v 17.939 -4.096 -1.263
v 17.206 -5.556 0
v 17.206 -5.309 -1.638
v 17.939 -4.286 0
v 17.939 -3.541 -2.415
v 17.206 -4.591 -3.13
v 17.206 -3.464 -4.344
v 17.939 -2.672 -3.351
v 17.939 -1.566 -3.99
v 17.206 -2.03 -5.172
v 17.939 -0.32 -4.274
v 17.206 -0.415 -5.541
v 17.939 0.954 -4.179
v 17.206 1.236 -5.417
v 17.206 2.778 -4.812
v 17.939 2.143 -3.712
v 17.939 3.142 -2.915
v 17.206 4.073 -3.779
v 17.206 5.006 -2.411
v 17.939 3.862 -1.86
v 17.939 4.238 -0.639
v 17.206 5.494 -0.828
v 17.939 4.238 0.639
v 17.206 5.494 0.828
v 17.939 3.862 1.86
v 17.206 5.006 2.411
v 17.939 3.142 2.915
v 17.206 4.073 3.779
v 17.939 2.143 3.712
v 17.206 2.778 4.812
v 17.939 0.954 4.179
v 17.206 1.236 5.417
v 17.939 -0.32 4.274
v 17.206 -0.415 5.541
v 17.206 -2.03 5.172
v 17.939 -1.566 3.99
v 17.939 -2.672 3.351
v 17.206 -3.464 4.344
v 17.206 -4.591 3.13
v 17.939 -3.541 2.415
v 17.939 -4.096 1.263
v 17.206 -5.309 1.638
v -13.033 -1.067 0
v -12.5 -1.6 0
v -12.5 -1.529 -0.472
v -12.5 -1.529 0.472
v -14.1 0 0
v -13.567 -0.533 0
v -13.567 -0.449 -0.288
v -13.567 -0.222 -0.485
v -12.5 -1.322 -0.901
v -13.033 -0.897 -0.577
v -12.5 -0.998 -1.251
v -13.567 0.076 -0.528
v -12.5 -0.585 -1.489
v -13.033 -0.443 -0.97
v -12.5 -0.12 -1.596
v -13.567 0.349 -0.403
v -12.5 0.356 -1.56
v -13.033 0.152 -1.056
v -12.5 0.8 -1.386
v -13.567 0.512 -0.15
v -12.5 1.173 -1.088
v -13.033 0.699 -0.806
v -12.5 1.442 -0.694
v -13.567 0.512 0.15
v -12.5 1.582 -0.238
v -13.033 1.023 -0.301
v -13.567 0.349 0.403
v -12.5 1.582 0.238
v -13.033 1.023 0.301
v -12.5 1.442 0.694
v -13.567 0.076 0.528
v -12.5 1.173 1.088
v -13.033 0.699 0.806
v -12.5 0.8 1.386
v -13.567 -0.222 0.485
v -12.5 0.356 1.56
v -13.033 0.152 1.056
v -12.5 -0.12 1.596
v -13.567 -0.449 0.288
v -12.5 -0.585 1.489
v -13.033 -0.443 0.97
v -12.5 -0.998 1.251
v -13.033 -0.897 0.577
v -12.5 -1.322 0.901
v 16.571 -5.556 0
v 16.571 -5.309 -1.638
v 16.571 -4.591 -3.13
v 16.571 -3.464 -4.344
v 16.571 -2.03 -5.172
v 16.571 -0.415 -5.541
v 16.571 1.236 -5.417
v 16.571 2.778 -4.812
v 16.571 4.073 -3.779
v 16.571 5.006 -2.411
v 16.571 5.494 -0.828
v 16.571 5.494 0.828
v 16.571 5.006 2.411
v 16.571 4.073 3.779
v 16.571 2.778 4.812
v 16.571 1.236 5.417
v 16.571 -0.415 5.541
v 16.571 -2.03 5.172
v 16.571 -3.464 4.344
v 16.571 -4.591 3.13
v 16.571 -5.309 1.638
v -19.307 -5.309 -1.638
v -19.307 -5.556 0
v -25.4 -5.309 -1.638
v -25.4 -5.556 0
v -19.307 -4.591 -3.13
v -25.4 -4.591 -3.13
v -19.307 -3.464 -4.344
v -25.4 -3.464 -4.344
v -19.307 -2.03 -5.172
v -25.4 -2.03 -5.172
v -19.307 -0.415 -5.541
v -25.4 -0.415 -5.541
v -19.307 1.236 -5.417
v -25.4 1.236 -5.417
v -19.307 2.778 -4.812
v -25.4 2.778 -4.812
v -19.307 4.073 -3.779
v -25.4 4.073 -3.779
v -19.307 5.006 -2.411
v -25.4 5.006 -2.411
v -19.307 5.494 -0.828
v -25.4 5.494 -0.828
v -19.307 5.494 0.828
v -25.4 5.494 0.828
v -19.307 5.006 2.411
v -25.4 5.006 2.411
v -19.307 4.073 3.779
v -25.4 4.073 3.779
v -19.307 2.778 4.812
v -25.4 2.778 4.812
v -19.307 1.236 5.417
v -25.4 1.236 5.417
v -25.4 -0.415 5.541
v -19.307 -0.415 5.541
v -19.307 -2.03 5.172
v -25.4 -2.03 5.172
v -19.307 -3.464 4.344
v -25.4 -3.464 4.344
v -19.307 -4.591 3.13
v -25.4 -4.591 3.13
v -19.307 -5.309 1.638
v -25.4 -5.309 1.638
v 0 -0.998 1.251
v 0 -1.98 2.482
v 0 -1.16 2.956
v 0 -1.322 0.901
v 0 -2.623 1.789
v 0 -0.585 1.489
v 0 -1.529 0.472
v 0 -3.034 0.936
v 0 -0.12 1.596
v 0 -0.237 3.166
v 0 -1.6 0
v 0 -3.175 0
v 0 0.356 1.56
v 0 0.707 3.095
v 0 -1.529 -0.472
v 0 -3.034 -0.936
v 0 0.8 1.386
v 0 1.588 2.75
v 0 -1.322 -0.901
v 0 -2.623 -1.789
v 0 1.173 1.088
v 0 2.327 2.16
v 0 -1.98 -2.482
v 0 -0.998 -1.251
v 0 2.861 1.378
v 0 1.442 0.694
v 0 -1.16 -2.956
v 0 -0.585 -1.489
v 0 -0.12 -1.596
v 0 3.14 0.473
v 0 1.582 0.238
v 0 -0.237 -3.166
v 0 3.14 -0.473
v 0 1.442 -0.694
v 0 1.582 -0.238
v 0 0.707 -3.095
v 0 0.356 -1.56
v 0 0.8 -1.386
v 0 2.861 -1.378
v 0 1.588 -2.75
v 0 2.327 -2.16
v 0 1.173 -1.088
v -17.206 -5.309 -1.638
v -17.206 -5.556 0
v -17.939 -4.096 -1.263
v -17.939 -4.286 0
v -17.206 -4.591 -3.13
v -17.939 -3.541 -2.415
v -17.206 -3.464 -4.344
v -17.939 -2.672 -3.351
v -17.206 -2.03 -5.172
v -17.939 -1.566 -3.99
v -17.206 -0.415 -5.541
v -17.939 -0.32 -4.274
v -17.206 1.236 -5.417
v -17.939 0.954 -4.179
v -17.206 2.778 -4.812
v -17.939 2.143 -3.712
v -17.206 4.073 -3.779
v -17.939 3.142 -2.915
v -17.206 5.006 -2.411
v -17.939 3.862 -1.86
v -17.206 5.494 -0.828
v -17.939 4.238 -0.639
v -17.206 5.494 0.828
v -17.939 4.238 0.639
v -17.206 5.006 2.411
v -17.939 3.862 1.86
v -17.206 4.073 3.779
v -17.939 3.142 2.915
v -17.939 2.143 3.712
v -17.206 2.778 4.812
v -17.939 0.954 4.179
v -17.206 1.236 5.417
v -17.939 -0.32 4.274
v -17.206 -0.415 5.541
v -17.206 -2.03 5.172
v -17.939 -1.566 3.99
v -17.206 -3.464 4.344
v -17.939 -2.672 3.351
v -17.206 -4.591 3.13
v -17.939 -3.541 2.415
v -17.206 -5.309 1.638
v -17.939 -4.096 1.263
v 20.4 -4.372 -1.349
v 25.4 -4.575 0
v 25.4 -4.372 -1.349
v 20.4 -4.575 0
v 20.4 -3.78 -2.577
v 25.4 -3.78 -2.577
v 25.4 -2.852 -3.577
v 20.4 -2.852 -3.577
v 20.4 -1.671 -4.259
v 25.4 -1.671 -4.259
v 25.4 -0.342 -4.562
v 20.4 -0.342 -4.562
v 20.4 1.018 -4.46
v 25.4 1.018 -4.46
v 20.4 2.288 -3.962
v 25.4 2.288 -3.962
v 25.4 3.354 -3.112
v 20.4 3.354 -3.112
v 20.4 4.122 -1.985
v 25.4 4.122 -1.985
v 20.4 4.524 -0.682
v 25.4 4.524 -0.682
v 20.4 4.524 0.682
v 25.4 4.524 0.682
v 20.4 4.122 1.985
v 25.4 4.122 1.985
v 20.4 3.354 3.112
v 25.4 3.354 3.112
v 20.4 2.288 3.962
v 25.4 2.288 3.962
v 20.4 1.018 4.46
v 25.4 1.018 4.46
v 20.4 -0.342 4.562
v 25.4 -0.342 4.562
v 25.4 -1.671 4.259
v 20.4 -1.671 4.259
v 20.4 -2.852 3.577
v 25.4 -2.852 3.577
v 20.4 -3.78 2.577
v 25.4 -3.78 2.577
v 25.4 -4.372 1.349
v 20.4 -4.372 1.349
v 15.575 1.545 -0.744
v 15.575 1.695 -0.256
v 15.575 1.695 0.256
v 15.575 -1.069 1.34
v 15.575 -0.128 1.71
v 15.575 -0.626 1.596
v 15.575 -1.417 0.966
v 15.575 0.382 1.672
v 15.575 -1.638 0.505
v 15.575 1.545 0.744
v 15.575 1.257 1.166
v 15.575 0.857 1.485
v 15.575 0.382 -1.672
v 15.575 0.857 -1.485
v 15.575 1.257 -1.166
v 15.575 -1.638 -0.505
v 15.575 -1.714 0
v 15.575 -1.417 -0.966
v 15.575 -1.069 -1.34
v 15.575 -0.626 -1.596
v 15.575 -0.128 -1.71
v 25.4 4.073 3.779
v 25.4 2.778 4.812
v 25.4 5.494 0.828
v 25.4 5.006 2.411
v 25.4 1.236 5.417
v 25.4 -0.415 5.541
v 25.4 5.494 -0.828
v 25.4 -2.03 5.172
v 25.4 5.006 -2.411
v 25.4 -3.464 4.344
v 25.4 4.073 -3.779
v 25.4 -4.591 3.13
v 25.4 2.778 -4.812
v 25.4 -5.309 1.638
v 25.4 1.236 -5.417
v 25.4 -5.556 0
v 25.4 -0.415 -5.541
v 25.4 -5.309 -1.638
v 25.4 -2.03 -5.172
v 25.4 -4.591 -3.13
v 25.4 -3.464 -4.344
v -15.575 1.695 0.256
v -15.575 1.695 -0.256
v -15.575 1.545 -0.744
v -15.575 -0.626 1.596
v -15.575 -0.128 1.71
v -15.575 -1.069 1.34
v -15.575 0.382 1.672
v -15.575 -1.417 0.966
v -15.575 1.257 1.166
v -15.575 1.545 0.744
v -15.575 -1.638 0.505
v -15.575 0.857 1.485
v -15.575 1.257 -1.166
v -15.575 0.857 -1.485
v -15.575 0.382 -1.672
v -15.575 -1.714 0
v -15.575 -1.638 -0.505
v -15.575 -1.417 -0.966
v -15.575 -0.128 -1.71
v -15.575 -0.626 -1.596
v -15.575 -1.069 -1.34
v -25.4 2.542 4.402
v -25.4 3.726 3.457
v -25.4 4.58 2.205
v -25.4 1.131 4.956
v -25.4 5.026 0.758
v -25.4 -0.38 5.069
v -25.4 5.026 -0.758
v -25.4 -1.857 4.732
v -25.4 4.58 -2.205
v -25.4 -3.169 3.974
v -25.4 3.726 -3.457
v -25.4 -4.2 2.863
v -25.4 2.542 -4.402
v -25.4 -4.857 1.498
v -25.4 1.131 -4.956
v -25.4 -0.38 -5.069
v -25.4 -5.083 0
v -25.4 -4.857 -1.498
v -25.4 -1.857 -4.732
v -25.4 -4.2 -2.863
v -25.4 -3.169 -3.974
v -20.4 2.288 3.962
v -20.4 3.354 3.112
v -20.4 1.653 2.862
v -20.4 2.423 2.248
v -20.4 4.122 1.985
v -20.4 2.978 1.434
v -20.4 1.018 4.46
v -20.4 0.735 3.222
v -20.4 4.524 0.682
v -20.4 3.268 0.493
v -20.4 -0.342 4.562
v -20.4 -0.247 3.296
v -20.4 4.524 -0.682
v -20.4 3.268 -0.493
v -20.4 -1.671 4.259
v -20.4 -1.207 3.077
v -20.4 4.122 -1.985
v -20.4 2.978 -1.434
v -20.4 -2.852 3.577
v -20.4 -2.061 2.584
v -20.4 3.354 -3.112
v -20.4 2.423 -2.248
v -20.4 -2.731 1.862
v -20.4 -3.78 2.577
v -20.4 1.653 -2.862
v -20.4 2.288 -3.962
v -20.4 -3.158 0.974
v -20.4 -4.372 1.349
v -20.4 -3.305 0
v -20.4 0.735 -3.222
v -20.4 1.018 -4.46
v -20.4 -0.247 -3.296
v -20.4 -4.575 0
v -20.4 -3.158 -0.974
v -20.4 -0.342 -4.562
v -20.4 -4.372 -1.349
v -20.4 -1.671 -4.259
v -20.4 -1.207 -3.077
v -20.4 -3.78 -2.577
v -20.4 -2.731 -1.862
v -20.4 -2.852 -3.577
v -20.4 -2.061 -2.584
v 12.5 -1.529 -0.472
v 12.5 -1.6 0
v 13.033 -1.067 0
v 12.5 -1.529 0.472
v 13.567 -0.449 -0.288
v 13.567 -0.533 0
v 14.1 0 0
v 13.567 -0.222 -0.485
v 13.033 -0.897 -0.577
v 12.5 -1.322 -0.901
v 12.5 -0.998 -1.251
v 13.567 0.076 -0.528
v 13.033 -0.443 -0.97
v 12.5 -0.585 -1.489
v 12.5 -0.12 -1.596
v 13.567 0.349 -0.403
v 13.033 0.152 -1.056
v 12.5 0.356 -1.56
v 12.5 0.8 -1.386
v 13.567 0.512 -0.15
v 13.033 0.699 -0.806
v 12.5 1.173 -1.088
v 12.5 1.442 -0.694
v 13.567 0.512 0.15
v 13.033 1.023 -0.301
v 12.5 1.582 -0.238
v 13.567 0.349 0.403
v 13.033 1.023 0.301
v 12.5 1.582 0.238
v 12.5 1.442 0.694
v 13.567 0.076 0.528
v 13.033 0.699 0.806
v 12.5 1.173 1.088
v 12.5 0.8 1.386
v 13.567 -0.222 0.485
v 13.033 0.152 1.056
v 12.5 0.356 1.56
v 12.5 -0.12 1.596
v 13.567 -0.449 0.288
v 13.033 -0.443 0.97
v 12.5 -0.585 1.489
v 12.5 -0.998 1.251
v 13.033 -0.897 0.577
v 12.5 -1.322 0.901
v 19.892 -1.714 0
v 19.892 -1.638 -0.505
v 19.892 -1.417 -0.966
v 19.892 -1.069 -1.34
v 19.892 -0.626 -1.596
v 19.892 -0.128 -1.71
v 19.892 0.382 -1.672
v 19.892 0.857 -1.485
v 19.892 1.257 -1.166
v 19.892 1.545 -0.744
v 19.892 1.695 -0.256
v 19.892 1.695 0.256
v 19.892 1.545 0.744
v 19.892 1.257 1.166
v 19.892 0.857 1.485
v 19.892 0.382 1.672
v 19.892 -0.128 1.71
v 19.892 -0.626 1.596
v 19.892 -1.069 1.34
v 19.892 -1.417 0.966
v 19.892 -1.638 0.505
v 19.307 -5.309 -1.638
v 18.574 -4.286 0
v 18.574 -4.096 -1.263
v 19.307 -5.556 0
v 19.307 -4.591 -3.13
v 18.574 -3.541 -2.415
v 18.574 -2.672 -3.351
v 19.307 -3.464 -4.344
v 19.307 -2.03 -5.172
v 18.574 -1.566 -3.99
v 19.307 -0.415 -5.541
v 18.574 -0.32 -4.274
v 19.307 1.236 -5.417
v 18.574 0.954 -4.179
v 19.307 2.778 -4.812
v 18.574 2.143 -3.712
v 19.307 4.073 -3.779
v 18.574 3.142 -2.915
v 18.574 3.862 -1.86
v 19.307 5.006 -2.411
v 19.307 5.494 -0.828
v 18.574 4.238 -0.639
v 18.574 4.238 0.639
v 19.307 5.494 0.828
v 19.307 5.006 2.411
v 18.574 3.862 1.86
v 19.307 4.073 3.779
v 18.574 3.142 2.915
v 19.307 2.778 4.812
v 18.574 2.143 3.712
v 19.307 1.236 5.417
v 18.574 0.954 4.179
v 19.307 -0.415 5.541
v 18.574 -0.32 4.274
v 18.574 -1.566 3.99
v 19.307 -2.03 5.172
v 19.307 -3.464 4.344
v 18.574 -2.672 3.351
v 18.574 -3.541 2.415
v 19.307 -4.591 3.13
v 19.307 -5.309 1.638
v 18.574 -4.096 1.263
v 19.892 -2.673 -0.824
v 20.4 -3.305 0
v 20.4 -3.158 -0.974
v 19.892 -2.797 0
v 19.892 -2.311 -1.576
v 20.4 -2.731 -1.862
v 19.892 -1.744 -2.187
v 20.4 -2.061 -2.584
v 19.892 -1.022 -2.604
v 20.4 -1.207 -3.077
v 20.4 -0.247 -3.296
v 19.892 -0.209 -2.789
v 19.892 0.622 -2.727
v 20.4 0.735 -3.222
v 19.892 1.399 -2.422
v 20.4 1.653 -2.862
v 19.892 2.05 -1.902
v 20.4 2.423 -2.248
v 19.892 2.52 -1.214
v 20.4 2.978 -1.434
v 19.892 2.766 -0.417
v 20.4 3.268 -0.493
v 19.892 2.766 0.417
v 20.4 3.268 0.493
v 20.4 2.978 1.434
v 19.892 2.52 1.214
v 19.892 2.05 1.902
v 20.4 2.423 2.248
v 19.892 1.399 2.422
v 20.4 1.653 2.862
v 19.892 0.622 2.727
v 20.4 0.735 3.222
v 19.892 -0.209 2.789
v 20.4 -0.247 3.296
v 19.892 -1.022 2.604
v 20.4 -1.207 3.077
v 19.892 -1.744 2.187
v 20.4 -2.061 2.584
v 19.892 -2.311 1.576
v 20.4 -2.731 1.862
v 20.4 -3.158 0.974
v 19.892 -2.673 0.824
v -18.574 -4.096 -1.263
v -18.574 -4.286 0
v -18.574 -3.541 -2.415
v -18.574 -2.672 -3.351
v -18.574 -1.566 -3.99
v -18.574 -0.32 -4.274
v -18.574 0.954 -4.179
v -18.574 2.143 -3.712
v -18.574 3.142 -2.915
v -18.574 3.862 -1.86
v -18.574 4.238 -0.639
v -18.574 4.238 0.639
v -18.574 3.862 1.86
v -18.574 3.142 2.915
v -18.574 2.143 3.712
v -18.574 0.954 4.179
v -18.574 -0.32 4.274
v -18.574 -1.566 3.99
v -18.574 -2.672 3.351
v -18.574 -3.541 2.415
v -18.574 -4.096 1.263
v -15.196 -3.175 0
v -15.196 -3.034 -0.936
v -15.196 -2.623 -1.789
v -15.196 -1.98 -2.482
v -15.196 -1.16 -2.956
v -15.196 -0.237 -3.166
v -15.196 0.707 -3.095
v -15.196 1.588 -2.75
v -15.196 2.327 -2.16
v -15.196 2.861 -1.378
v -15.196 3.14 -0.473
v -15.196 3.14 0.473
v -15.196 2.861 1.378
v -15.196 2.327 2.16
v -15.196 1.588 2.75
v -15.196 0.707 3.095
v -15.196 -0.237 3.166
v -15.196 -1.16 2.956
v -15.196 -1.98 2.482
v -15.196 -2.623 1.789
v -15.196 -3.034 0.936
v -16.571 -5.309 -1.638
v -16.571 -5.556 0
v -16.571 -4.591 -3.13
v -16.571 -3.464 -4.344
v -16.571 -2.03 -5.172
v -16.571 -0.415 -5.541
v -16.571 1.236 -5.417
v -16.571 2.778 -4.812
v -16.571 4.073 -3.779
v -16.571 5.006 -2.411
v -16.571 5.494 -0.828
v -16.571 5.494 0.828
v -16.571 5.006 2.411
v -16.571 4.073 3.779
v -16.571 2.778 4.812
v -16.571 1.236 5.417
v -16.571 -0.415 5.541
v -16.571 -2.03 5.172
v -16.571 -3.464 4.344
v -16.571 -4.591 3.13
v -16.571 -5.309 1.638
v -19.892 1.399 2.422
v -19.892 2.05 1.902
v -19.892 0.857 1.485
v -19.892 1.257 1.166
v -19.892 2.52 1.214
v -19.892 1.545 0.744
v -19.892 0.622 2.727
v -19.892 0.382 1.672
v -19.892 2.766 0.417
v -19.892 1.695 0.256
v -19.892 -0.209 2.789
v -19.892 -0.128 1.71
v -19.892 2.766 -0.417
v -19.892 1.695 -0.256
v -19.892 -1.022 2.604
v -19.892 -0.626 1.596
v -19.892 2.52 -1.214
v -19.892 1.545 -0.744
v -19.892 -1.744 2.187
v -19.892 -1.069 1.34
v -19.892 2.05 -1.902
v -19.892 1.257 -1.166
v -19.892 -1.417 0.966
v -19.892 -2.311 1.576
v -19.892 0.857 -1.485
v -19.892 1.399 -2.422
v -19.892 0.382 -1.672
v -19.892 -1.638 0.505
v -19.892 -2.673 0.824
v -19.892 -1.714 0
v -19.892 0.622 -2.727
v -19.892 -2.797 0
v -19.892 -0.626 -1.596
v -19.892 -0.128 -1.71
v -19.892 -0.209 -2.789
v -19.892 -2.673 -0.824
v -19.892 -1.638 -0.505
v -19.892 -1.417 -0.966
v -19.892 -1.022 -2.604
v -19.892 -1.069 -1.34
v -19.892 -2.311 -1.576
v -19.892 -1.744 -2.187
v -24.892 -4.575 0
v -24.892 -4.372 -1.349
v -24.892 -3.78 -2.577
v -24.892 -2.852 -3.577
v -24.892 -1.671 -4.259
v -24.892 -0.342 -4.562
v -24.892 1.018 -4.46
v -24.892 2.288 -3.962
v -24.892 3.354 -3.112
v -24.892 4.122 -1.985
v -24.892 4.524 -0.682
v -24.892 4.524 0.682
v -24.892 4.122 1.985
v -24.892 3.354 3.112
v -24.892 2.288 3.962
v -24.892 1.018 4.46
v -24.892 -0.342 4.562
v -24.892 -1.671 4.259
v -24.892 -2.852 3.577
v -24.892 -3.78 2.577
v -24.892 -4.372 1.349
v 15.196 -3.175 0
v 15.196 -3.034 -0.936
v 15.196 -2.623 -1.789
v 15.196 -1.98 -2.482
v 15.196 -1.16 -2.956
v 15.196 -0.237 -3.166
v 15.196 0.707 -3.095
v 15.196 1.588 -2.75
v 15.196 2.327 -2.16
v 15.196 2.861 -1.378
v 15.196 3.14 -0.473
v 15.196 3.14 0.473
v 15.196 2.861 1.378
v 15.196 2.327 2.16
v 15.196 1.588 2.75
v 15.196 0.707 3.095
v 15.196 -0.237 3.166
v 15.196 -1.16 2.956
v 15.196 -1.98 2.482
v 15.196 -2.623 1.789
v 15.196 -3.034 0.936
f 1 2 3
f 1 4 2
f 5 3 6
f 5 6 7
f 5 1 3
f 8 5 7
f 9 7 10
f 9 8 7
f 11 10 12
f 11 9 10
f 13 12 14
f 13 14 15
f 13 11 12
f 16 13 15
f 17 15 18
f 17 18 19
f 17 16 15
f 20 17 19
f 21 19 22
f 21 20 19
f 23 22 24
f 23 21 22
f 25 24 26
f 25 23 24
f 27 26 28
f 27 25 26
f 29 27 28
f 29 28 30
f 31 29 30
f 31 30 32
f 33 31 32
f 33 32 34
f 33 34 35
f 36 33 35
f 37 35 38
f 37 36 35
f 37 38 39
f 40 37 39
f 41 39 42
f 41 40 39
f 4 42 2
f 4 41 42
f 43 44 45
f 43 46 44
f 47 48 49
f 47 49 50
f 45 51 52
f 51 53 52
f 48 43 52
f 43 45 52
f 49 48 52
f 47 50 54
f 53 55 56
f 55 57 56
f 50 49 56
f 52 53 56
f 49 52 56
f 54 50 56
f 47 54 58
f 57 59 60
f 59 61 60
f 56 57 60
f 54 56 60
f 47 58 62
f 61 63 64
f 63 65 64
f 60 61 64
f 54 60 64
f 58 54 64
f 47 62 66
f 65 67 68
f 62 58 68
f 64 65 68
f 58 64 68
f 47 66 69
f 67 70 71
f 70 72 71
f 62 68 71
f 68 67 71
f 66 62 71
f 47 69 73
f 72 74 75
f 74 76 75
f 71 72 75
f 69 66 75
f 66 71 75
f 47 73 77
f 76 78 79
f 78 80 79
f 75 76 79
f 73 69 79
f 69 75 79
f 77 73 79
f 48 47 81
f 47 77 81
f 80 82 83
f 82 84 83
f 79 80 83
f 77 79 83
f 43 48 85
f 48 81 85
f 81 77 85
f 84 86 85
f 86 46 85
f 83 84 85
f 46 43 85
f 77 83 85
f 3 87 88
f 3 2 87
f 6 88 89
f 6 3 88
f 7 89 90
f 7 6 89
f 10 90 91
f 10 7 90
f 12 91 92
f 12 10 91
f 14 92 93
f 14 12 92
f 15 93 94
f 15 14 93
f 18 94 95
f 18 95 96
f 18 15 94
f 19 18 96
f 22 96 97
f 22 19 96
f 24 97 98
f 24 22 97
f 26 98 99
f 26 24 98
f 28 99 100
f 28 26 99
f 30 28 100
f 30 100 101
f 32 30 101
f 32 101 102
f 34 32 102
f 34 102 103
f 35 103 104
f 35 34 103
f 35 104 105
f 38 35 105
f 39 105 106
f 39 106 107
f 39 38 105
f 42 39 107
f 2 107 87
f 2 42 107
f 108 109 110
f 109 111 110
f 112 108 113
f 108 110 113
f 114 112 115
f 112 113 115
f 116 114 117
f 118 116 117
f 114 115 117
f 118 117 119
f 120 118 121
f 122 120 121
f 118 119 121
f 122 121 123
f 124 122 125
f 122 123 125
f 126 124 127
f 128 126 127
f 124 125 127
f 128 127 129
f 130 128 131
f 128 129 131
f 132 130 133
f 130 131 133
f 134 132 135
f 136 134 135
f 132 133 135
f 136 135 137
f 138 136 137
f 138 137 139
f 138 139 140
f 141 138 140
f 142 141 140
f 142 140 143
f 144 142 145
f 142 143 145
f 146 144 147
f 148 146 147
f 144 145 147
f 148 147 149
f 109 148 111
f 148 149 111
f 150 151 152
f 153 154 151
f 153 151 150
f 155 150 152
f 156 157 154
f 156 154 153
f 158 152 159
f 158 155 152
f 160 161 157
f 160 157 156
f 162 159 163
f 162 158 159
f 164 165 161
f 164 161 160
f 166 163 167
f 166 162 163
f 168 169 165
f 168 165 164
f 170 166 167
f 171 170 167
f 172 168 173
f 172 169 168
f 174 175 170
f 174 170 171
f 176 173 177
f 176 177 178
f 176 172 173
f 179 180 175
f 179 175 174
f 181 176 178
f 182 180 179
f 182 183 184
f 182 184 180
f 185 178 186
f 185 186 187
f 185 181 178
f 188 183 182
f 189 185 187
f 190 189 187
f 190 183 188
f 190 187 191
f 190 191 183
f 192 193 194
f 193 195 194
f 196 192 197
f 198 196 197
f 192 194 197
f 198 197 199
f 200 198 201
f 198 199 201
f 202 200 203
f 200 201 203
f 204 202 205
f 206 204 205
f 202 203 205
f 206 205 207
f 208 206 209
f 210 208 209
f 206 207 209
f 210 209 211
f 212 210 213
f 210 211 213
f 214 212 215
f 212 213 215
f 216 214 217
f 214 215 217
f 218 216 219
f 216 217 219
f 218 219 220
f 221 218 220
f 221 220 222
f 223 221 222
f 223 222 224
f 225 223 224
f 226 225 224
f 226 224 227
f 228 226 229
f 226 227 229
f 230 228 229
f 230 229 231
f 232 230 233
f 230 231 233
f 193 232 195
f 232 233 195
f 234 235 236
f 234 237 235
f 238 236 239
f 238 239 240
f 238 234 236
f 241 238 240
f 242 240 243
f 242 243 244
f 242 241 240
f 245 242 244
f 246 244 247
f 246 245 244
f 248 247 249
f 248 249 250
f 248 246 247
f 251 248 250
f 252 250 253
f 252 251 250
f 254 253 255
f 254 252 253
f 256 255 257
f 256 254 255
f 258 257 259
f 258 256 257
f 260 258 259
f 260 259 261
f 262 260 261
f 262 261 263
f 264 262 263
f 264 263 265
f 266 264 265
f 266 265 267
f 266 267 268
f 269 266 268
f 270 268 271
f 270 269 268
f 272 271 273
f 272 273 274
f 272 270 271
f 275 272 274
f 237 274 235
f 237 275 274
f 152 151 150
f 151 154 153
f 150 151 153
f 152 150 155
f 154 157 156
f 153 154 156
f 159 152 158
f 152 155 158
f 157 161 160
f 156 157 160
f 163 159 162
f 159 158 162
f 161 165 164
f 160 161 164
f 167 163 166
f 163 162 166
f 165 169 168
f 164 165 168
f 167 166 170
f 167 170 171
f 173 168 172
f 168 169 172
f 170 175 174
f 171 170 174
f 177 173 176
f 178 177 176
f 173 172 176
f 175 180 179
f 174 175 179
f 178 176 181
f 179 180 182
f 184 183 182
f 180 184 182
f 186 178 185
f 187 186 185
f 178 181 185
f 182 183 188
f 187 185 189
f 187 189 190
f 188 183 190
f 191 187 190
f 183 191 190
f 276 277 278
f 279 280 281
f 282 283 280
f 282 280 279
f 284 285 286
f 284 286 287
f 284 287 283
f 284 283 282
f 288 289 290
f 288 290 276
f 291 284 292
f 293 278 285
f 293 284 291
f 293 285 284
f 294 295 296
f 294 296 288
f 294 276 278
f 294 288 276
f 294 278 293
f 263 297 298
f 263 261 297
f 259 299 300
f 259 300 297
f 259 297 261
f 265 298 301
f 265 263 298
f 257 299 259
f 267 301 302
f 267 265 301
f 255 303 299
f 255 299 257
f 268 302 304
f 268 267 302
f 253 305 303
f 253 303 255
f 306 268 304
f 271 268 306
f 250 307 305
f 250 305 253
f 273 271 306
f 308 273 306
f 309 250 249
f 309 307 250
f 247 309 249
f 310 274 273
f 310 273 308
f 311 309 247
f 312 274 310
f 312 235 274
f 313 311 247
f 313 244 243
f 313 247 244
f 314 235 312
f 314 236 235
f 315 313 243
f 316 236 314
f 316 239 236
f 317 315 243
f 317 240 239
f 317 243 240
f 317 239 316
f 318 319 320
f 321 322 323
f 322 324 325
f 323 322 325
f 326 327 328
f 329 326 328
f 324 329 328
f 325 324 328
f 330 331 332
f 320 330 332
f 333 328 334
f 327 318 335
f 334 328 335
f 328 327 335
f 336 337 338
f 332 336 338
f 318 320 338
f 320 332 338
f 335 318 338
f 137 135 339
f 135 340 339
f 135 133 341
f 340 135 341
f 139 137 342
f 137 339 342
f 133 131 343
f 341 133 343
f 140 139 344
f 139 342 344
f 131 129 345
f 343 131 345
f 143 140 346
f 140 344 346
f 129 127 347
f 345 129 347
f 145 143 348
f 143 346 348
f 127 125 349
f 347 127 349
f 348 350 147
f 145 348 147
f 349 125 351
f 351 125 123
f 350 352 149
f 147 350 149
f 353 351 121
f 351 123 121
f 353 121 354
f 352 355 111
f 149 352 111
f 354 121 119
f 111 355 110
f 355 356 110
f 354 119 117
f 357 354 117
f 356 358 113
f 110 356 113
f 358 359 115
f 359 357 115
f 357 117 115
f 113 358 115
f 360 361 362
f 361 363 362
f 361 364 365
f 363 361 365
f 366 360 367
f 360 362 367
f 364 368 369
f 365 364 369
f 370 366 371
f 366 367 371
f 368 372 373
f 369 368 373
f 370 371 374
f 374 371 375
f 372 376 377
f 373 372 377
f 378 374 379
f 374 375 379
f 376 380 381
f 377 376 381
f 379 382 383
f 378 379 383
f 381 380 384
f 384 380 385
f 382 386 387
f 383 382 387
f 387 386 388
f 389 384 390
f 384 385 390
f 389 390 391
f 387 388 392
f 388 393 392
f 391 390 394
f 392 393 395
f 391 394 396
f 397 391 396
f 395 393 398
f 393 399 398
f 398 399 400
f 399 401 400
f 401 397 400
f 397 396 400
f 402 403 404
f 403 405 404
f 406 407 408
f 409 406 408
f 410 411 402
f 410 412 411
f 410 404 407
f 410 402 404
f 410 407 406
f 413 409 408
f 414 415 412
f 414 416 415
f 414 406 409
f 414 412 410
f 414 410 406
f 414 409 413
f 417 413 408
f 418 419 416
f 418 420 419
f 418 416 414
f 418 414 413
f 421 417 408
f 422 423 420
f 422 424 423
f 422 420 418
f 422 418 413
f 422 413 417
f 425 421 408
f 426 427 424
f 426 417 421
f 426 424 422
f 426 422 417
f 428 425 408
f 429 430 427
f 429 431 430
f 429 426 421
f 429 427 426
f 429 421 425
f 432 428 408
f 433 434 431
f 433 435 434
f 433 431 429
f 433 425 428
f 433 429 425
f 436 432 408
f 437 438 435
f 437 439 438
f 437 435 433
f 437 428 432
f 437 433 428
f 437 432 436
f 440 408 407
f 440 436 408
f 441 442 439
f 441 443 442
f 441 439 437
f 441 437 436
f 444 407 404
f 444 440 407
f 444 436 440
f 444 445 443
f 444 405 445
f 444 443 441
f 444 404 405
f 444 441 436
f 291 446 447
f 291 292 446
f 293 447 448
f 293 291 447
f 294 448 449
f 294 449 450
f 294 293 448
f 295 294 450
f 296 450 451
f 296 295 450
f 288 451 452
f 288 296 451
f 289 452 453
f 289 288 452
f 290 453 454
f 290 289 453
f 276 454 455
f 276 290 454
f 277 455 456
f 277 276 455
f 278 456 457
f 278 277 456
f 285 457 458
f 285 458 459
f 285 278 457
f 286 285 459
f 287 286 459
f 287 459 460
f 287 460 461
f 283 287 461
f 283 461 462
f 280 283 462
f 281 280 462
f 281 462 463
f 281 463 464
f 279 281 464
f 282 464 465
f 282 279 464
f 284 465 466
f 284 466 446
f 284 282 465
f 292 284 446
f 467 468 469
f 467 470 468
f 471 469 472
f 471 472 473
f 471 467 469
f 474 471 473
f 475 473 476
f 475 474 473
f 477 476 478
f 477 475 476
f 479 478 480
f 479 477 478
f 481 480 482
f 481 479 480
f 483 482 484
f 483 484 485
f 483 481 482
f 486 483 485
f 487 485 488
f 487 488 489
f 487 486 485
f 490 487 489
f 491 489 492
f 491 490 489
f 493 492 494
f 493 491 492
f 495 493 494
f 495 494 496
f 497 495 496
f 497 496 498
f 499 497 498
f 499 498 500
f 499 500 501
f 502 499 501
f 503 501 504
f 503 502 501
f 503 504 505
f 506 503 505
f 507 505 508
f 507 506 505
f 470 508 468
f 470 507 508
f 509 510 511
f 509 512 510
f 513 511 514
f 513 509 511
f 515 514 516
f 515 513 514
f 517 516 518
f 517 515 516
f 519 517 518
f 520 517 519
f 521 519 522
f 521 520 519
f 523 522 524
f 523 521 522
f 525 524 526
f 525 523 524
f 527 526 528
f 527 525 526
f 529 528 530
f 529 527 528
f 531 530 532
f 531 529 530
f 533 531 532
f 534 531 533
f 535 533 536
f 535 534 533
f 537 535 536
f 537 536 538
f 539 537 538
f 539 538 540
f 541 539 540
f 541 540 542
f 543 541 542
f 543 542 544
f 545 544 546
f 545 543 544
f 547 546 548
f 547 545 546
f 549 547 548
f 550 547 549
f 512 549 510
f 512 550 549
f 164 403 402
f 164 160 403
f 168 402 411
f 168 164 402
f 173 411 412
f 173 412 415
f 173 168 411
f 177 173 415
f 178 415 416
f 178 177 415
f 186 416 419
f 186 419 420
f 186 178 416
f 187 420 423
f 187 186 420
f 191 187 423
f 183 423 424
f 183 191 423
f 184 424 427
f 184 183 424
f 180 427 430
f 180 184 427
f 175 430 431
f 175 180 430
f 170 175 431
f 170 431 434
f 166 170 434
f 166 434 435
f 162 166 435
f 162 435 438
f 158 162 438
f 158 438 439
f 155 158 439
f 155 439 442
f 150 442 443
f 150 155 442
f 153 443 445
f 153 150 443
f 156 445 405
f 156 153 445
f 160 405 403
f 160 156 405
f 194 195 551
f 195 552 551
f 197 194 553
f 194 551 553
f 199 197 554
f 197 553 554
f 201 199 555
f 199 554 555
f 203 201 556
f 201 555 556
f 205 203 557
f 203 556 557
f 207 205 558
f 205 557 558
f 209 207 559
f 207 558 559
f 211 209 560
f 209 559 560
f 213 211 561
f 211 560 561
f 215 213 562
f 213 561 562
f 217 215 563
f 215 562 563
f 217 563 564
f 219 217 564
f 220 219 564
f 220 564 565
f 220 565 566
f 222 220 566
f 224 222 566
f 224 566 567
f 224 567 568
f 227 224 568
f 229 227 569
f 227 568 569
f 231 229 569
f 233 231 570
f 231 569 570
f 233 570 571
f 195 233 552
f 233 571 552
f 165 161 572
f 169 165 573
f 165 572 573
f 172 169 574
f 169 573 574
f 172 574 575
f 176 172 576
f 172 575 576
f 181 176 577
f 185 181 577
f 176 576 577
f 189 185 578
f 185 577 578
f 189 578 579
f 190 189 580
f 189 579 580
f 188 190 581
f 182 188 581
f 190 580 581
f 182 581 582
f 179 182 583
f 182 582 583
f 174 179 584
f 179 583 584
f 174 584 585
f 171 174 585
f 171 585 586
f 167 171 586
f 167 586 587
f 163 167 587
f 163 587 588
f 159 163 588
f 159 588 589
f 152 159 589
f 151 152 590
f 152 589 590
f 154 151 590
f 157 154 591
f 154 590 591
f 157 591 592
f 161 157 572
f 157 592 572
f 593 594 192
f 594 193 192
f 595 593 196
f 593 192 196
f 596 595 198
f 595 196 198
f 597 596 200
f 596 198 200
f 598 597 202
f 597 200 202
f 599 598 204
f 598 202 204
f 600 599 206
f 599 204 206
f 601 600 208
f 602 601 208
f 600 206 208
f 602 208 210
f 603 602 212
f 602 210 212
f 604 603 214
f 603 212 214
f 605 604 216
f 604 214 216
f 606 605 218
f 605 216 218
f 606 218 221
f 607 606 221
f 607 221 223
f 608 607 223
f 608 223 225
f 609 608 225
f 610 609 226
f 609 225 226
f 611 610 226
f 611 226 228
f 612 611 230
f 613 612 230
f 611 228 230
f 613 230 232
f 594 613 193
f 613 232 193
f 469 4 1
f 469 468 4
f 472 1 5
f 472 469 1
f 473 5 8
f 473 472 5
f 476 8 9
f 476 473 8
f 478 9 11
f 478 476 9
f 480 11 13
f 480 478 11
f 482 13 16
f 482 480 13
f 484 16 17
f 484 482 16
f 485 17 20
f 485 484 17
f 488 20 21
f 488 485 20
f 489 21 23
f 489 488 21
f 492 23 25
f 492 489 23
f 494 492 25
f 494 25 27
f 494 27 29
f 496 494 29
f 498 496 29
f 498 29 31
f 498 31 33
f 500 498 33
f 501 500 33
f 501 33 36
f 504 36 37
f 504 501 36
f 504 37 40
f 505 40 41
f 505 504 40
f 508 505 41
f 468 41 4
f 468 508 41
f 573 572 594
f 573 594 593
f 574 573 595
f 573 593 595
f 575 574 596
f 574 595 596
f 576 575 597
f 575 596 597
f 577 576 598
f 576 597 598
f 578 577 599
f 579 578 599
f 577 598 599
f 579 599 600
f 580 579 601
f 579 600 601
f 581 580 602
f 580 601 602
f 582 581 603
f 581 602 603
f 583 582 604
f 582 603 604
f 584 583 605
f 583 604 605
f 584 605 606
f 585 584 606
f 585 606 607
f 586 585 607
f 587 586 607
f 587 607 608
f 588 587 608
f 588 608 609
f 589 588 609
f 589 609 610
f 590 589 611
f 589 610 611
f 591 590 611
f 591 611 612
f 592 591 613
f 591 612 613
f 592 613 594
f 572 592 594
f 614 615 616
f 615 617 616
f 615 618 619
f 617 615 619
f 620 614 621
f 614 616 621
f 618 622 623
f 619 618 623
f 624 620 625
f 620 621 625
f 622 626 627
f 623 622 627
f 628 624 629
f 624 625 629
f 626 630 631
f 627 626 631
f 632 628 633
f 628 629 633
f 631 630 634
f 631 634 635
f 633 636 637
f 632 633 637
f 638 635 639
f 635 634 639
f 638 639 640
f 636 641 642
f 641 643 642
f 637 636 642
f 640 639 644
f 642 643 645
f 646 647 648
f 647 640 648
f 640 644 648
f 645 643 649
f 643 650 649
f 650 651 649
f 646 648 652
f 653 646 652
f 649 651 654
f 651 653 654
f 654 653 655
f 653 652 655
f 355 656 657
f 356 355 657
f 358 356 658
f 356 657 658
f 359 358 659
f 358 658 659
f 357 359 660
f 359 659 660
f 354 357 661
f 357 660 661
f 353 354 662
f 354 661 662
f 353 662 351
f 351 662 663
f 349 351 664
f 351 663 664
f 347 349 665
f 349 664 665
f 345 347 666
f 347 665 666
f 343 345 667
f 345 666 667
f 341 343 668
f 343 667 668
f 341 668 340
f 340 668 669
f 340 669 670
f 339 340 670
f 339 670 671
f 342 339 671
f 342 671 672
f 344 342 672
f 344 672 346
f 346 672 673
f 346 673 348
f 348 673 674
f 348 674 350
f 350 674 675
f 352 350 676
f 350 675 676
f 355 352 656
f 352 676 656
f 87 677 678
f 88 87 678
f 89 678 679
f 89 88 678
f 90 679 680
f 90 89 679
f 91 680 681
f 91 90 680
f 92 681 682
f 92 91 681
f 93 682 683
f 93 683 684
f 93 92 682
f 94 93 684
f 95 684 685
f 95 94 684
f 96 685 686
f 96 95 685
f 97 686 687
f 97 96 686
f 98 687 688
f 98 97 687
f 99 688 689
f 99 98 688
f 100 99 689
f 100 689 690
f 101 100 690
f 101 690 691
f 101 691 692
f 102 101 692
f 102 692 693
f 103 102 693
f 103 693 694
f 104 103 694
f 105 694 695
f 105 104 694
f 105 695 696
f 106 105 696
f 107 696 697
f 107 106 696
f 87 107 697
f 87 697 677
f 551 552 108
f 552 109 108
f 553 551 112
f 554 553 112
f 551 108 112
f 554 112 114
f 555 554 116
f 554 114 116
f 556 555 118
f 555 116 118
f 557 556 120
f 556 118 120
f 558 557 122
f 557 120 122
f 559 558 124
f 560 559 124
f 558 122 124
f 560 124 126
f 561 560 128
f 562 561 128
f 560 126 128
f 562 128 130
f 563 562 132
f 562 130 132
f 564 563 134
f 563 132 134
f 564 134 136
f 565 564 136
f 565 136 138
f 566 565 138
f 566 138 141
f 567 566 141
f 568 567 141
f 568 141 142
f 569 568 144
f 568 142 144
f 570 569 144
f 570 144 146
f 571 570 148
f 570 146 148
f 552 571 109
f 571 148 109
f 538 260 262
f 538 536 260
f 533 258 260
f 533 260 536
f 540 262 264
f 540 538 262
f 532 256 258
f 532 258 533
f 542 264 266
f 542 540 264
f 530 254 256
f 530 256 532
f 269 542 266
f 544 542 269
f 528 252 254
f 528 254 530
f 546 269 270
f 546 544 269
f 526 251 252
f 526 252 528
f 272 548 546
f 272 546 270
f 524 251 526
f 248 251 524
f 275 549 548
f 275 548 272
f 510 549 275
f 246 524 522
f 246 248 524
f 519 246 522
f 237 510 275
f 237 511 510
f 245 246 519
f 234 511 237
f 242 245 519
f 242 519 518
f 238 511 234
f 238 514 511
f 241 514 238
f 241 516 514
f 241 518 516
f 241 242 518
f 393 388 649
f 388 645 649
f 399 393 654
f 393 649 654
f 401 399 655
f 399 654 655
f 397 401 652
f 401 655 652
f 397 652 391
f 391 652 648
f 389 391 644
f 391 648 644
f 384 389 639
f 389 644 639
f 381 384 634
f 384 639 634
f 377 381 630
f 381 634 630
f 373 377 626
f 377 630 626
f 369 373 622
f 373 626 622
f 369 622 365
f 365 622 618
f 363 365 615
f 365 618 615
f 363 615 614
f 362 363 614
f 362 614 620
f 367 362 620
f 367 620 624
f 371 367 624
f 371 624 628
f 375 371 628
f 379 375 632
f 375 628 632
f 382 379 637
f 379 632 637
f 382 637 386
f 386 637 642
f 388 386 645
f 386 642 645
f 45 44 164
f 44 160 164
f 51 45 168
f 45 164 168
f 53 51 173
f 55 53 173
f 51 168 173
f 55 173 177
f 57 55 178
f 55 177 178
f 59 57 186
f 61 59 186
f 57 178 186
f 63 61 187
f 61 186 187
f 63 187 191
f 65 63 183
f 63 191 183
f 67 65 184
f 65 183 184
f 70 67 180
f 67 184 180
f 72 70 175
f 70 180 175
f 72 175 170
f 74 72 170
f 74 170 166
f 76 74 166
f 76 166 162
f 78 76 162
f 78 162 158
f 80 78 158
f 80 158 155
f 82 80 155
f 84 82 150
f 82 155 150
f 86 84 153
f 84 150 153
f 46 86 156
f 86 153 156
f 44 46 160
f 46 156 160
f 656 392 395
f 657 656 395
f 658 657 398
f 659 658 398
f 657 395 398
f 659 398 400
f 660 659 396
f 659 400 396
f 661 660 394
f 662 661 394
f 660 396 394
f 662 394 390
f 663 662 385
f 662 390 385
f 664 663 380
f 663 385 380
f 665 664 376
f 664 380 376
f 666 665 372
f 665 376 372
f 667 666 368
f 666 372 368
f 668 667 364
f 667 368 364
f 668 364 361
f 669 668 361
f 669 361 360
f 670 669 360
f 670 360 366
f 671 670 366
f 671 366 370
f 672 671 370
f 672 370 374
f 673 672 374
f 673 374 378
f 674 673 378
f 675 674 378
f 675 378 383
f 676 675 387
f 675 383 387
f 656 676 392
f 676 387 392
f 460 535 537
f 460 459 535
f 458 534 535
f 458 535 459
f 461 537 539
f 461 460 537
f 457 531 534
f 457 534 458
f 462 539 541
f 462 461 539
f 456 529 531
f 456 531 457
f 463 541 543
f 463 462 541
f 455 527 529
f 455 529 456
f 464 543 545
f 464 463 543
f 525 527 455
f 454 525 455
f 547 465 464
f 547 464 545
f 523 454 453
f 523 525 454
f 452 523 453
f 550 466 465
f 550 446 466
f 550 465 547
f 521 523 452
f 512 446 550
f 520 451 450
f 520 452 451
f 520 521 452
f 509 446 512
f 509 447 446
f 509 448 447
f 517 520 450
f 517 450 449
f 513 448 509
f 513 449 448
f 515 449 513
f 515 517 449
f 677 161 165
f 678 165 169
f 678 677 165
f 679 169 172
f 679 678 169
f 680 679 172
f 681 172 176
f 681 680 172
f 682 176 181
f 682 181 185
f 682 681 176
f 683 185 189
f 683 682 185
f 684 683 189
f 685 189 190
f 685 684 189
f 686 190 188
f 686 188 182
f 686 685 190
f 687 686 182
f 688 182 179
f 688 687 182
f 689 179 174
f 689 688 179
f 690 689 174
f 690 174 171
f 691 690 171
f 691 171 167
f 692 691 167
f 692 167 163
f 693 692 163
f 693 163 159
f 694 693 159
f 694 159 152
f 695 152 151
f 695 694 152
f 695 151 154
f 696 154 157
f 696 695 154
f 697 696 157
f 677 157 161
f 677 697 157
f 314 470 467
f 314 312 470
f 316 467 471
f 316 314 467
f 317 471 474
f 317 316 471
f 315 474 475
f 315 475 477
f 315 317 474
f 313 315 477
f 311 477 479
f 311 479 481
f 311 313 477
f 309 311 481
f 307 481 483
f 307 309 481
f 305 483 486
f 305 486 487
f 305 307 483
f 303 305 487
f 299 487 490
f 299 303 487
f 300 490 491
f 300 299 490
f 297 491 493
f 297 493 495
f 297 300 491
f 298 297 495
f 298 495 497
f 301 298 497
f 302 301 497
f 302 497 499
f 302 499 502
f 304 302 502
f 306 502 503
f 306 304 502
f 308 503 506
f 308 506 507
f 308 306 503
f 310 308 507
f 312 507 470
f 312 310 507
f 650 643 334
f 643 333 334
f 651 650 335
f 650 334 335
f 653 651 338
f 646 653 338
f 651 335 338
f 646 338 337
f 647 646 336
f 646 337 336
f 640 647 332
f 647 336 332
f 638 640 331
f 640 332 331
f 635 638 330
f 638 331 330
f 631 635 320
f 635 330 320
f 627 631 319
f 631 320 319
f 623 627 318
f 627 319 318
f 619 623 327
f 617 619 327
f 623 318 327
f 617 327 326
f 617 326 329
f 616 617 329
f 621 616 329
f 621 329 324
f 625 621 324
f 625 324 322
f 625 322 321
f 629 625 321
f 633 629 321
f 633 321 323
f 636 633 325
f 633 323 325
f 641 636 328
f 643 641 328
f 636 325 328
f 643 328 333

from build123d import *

# Parameters (mm, degrees)
CHAMFER1_SIZE = 0.508


with BuildPart() as part:
    # Sketch2 → Revolve1 (revolve)
    with BuildSketch(Plane.XY, mode=Mode.PRIVATE) as revolve1_sk:
        Polygon((-19.306984842, 5.55625), (-25.4, 5.55625), (-25.4, 4.575), (-20.4, 4.575), (-20.4, 3.305), (-19.892, 2.797), (-19.892, 1.7145), (-15.575, 1.7145), (-15.575, 0), (-14.1, 0), (-12.5, 1.6), (0, 1.6), (0, 3.175), (-15.19569983, 3.175), (-16.570515158, 5.55625), (-17.205515158, 5.55625), (-17.93875, 4.28625), (-18.57375, 4.28625), align=None)
    revolve(revolve1_sk.sketch.rotate(Axis((-25.4, 0, 0), (1, 0, 0)), 180), axis=Axis((-25.4, 0, 0), (1, 0, 0)))


with BuildPart() as body_2:
    # Mirror1: mirrored copy
    add(part.part.mirror(Plane(origin=(0, 0, 0), x_dir=(0, 0, 1), z_dir=(1, 0, 0))))


with BuildPart() as part_1:
    add(part.part)

    # Chamfer1
    chamfer1_edges = [part_1.edges().sort_by_distance(p)[0] for p in [
        (-25.4, 4.575, 0),
    ]]
    chamfer(chamfer1_edges, length=CHAMFER1_SIZE)


solid = Compound([body_2.part, part_1.part])
